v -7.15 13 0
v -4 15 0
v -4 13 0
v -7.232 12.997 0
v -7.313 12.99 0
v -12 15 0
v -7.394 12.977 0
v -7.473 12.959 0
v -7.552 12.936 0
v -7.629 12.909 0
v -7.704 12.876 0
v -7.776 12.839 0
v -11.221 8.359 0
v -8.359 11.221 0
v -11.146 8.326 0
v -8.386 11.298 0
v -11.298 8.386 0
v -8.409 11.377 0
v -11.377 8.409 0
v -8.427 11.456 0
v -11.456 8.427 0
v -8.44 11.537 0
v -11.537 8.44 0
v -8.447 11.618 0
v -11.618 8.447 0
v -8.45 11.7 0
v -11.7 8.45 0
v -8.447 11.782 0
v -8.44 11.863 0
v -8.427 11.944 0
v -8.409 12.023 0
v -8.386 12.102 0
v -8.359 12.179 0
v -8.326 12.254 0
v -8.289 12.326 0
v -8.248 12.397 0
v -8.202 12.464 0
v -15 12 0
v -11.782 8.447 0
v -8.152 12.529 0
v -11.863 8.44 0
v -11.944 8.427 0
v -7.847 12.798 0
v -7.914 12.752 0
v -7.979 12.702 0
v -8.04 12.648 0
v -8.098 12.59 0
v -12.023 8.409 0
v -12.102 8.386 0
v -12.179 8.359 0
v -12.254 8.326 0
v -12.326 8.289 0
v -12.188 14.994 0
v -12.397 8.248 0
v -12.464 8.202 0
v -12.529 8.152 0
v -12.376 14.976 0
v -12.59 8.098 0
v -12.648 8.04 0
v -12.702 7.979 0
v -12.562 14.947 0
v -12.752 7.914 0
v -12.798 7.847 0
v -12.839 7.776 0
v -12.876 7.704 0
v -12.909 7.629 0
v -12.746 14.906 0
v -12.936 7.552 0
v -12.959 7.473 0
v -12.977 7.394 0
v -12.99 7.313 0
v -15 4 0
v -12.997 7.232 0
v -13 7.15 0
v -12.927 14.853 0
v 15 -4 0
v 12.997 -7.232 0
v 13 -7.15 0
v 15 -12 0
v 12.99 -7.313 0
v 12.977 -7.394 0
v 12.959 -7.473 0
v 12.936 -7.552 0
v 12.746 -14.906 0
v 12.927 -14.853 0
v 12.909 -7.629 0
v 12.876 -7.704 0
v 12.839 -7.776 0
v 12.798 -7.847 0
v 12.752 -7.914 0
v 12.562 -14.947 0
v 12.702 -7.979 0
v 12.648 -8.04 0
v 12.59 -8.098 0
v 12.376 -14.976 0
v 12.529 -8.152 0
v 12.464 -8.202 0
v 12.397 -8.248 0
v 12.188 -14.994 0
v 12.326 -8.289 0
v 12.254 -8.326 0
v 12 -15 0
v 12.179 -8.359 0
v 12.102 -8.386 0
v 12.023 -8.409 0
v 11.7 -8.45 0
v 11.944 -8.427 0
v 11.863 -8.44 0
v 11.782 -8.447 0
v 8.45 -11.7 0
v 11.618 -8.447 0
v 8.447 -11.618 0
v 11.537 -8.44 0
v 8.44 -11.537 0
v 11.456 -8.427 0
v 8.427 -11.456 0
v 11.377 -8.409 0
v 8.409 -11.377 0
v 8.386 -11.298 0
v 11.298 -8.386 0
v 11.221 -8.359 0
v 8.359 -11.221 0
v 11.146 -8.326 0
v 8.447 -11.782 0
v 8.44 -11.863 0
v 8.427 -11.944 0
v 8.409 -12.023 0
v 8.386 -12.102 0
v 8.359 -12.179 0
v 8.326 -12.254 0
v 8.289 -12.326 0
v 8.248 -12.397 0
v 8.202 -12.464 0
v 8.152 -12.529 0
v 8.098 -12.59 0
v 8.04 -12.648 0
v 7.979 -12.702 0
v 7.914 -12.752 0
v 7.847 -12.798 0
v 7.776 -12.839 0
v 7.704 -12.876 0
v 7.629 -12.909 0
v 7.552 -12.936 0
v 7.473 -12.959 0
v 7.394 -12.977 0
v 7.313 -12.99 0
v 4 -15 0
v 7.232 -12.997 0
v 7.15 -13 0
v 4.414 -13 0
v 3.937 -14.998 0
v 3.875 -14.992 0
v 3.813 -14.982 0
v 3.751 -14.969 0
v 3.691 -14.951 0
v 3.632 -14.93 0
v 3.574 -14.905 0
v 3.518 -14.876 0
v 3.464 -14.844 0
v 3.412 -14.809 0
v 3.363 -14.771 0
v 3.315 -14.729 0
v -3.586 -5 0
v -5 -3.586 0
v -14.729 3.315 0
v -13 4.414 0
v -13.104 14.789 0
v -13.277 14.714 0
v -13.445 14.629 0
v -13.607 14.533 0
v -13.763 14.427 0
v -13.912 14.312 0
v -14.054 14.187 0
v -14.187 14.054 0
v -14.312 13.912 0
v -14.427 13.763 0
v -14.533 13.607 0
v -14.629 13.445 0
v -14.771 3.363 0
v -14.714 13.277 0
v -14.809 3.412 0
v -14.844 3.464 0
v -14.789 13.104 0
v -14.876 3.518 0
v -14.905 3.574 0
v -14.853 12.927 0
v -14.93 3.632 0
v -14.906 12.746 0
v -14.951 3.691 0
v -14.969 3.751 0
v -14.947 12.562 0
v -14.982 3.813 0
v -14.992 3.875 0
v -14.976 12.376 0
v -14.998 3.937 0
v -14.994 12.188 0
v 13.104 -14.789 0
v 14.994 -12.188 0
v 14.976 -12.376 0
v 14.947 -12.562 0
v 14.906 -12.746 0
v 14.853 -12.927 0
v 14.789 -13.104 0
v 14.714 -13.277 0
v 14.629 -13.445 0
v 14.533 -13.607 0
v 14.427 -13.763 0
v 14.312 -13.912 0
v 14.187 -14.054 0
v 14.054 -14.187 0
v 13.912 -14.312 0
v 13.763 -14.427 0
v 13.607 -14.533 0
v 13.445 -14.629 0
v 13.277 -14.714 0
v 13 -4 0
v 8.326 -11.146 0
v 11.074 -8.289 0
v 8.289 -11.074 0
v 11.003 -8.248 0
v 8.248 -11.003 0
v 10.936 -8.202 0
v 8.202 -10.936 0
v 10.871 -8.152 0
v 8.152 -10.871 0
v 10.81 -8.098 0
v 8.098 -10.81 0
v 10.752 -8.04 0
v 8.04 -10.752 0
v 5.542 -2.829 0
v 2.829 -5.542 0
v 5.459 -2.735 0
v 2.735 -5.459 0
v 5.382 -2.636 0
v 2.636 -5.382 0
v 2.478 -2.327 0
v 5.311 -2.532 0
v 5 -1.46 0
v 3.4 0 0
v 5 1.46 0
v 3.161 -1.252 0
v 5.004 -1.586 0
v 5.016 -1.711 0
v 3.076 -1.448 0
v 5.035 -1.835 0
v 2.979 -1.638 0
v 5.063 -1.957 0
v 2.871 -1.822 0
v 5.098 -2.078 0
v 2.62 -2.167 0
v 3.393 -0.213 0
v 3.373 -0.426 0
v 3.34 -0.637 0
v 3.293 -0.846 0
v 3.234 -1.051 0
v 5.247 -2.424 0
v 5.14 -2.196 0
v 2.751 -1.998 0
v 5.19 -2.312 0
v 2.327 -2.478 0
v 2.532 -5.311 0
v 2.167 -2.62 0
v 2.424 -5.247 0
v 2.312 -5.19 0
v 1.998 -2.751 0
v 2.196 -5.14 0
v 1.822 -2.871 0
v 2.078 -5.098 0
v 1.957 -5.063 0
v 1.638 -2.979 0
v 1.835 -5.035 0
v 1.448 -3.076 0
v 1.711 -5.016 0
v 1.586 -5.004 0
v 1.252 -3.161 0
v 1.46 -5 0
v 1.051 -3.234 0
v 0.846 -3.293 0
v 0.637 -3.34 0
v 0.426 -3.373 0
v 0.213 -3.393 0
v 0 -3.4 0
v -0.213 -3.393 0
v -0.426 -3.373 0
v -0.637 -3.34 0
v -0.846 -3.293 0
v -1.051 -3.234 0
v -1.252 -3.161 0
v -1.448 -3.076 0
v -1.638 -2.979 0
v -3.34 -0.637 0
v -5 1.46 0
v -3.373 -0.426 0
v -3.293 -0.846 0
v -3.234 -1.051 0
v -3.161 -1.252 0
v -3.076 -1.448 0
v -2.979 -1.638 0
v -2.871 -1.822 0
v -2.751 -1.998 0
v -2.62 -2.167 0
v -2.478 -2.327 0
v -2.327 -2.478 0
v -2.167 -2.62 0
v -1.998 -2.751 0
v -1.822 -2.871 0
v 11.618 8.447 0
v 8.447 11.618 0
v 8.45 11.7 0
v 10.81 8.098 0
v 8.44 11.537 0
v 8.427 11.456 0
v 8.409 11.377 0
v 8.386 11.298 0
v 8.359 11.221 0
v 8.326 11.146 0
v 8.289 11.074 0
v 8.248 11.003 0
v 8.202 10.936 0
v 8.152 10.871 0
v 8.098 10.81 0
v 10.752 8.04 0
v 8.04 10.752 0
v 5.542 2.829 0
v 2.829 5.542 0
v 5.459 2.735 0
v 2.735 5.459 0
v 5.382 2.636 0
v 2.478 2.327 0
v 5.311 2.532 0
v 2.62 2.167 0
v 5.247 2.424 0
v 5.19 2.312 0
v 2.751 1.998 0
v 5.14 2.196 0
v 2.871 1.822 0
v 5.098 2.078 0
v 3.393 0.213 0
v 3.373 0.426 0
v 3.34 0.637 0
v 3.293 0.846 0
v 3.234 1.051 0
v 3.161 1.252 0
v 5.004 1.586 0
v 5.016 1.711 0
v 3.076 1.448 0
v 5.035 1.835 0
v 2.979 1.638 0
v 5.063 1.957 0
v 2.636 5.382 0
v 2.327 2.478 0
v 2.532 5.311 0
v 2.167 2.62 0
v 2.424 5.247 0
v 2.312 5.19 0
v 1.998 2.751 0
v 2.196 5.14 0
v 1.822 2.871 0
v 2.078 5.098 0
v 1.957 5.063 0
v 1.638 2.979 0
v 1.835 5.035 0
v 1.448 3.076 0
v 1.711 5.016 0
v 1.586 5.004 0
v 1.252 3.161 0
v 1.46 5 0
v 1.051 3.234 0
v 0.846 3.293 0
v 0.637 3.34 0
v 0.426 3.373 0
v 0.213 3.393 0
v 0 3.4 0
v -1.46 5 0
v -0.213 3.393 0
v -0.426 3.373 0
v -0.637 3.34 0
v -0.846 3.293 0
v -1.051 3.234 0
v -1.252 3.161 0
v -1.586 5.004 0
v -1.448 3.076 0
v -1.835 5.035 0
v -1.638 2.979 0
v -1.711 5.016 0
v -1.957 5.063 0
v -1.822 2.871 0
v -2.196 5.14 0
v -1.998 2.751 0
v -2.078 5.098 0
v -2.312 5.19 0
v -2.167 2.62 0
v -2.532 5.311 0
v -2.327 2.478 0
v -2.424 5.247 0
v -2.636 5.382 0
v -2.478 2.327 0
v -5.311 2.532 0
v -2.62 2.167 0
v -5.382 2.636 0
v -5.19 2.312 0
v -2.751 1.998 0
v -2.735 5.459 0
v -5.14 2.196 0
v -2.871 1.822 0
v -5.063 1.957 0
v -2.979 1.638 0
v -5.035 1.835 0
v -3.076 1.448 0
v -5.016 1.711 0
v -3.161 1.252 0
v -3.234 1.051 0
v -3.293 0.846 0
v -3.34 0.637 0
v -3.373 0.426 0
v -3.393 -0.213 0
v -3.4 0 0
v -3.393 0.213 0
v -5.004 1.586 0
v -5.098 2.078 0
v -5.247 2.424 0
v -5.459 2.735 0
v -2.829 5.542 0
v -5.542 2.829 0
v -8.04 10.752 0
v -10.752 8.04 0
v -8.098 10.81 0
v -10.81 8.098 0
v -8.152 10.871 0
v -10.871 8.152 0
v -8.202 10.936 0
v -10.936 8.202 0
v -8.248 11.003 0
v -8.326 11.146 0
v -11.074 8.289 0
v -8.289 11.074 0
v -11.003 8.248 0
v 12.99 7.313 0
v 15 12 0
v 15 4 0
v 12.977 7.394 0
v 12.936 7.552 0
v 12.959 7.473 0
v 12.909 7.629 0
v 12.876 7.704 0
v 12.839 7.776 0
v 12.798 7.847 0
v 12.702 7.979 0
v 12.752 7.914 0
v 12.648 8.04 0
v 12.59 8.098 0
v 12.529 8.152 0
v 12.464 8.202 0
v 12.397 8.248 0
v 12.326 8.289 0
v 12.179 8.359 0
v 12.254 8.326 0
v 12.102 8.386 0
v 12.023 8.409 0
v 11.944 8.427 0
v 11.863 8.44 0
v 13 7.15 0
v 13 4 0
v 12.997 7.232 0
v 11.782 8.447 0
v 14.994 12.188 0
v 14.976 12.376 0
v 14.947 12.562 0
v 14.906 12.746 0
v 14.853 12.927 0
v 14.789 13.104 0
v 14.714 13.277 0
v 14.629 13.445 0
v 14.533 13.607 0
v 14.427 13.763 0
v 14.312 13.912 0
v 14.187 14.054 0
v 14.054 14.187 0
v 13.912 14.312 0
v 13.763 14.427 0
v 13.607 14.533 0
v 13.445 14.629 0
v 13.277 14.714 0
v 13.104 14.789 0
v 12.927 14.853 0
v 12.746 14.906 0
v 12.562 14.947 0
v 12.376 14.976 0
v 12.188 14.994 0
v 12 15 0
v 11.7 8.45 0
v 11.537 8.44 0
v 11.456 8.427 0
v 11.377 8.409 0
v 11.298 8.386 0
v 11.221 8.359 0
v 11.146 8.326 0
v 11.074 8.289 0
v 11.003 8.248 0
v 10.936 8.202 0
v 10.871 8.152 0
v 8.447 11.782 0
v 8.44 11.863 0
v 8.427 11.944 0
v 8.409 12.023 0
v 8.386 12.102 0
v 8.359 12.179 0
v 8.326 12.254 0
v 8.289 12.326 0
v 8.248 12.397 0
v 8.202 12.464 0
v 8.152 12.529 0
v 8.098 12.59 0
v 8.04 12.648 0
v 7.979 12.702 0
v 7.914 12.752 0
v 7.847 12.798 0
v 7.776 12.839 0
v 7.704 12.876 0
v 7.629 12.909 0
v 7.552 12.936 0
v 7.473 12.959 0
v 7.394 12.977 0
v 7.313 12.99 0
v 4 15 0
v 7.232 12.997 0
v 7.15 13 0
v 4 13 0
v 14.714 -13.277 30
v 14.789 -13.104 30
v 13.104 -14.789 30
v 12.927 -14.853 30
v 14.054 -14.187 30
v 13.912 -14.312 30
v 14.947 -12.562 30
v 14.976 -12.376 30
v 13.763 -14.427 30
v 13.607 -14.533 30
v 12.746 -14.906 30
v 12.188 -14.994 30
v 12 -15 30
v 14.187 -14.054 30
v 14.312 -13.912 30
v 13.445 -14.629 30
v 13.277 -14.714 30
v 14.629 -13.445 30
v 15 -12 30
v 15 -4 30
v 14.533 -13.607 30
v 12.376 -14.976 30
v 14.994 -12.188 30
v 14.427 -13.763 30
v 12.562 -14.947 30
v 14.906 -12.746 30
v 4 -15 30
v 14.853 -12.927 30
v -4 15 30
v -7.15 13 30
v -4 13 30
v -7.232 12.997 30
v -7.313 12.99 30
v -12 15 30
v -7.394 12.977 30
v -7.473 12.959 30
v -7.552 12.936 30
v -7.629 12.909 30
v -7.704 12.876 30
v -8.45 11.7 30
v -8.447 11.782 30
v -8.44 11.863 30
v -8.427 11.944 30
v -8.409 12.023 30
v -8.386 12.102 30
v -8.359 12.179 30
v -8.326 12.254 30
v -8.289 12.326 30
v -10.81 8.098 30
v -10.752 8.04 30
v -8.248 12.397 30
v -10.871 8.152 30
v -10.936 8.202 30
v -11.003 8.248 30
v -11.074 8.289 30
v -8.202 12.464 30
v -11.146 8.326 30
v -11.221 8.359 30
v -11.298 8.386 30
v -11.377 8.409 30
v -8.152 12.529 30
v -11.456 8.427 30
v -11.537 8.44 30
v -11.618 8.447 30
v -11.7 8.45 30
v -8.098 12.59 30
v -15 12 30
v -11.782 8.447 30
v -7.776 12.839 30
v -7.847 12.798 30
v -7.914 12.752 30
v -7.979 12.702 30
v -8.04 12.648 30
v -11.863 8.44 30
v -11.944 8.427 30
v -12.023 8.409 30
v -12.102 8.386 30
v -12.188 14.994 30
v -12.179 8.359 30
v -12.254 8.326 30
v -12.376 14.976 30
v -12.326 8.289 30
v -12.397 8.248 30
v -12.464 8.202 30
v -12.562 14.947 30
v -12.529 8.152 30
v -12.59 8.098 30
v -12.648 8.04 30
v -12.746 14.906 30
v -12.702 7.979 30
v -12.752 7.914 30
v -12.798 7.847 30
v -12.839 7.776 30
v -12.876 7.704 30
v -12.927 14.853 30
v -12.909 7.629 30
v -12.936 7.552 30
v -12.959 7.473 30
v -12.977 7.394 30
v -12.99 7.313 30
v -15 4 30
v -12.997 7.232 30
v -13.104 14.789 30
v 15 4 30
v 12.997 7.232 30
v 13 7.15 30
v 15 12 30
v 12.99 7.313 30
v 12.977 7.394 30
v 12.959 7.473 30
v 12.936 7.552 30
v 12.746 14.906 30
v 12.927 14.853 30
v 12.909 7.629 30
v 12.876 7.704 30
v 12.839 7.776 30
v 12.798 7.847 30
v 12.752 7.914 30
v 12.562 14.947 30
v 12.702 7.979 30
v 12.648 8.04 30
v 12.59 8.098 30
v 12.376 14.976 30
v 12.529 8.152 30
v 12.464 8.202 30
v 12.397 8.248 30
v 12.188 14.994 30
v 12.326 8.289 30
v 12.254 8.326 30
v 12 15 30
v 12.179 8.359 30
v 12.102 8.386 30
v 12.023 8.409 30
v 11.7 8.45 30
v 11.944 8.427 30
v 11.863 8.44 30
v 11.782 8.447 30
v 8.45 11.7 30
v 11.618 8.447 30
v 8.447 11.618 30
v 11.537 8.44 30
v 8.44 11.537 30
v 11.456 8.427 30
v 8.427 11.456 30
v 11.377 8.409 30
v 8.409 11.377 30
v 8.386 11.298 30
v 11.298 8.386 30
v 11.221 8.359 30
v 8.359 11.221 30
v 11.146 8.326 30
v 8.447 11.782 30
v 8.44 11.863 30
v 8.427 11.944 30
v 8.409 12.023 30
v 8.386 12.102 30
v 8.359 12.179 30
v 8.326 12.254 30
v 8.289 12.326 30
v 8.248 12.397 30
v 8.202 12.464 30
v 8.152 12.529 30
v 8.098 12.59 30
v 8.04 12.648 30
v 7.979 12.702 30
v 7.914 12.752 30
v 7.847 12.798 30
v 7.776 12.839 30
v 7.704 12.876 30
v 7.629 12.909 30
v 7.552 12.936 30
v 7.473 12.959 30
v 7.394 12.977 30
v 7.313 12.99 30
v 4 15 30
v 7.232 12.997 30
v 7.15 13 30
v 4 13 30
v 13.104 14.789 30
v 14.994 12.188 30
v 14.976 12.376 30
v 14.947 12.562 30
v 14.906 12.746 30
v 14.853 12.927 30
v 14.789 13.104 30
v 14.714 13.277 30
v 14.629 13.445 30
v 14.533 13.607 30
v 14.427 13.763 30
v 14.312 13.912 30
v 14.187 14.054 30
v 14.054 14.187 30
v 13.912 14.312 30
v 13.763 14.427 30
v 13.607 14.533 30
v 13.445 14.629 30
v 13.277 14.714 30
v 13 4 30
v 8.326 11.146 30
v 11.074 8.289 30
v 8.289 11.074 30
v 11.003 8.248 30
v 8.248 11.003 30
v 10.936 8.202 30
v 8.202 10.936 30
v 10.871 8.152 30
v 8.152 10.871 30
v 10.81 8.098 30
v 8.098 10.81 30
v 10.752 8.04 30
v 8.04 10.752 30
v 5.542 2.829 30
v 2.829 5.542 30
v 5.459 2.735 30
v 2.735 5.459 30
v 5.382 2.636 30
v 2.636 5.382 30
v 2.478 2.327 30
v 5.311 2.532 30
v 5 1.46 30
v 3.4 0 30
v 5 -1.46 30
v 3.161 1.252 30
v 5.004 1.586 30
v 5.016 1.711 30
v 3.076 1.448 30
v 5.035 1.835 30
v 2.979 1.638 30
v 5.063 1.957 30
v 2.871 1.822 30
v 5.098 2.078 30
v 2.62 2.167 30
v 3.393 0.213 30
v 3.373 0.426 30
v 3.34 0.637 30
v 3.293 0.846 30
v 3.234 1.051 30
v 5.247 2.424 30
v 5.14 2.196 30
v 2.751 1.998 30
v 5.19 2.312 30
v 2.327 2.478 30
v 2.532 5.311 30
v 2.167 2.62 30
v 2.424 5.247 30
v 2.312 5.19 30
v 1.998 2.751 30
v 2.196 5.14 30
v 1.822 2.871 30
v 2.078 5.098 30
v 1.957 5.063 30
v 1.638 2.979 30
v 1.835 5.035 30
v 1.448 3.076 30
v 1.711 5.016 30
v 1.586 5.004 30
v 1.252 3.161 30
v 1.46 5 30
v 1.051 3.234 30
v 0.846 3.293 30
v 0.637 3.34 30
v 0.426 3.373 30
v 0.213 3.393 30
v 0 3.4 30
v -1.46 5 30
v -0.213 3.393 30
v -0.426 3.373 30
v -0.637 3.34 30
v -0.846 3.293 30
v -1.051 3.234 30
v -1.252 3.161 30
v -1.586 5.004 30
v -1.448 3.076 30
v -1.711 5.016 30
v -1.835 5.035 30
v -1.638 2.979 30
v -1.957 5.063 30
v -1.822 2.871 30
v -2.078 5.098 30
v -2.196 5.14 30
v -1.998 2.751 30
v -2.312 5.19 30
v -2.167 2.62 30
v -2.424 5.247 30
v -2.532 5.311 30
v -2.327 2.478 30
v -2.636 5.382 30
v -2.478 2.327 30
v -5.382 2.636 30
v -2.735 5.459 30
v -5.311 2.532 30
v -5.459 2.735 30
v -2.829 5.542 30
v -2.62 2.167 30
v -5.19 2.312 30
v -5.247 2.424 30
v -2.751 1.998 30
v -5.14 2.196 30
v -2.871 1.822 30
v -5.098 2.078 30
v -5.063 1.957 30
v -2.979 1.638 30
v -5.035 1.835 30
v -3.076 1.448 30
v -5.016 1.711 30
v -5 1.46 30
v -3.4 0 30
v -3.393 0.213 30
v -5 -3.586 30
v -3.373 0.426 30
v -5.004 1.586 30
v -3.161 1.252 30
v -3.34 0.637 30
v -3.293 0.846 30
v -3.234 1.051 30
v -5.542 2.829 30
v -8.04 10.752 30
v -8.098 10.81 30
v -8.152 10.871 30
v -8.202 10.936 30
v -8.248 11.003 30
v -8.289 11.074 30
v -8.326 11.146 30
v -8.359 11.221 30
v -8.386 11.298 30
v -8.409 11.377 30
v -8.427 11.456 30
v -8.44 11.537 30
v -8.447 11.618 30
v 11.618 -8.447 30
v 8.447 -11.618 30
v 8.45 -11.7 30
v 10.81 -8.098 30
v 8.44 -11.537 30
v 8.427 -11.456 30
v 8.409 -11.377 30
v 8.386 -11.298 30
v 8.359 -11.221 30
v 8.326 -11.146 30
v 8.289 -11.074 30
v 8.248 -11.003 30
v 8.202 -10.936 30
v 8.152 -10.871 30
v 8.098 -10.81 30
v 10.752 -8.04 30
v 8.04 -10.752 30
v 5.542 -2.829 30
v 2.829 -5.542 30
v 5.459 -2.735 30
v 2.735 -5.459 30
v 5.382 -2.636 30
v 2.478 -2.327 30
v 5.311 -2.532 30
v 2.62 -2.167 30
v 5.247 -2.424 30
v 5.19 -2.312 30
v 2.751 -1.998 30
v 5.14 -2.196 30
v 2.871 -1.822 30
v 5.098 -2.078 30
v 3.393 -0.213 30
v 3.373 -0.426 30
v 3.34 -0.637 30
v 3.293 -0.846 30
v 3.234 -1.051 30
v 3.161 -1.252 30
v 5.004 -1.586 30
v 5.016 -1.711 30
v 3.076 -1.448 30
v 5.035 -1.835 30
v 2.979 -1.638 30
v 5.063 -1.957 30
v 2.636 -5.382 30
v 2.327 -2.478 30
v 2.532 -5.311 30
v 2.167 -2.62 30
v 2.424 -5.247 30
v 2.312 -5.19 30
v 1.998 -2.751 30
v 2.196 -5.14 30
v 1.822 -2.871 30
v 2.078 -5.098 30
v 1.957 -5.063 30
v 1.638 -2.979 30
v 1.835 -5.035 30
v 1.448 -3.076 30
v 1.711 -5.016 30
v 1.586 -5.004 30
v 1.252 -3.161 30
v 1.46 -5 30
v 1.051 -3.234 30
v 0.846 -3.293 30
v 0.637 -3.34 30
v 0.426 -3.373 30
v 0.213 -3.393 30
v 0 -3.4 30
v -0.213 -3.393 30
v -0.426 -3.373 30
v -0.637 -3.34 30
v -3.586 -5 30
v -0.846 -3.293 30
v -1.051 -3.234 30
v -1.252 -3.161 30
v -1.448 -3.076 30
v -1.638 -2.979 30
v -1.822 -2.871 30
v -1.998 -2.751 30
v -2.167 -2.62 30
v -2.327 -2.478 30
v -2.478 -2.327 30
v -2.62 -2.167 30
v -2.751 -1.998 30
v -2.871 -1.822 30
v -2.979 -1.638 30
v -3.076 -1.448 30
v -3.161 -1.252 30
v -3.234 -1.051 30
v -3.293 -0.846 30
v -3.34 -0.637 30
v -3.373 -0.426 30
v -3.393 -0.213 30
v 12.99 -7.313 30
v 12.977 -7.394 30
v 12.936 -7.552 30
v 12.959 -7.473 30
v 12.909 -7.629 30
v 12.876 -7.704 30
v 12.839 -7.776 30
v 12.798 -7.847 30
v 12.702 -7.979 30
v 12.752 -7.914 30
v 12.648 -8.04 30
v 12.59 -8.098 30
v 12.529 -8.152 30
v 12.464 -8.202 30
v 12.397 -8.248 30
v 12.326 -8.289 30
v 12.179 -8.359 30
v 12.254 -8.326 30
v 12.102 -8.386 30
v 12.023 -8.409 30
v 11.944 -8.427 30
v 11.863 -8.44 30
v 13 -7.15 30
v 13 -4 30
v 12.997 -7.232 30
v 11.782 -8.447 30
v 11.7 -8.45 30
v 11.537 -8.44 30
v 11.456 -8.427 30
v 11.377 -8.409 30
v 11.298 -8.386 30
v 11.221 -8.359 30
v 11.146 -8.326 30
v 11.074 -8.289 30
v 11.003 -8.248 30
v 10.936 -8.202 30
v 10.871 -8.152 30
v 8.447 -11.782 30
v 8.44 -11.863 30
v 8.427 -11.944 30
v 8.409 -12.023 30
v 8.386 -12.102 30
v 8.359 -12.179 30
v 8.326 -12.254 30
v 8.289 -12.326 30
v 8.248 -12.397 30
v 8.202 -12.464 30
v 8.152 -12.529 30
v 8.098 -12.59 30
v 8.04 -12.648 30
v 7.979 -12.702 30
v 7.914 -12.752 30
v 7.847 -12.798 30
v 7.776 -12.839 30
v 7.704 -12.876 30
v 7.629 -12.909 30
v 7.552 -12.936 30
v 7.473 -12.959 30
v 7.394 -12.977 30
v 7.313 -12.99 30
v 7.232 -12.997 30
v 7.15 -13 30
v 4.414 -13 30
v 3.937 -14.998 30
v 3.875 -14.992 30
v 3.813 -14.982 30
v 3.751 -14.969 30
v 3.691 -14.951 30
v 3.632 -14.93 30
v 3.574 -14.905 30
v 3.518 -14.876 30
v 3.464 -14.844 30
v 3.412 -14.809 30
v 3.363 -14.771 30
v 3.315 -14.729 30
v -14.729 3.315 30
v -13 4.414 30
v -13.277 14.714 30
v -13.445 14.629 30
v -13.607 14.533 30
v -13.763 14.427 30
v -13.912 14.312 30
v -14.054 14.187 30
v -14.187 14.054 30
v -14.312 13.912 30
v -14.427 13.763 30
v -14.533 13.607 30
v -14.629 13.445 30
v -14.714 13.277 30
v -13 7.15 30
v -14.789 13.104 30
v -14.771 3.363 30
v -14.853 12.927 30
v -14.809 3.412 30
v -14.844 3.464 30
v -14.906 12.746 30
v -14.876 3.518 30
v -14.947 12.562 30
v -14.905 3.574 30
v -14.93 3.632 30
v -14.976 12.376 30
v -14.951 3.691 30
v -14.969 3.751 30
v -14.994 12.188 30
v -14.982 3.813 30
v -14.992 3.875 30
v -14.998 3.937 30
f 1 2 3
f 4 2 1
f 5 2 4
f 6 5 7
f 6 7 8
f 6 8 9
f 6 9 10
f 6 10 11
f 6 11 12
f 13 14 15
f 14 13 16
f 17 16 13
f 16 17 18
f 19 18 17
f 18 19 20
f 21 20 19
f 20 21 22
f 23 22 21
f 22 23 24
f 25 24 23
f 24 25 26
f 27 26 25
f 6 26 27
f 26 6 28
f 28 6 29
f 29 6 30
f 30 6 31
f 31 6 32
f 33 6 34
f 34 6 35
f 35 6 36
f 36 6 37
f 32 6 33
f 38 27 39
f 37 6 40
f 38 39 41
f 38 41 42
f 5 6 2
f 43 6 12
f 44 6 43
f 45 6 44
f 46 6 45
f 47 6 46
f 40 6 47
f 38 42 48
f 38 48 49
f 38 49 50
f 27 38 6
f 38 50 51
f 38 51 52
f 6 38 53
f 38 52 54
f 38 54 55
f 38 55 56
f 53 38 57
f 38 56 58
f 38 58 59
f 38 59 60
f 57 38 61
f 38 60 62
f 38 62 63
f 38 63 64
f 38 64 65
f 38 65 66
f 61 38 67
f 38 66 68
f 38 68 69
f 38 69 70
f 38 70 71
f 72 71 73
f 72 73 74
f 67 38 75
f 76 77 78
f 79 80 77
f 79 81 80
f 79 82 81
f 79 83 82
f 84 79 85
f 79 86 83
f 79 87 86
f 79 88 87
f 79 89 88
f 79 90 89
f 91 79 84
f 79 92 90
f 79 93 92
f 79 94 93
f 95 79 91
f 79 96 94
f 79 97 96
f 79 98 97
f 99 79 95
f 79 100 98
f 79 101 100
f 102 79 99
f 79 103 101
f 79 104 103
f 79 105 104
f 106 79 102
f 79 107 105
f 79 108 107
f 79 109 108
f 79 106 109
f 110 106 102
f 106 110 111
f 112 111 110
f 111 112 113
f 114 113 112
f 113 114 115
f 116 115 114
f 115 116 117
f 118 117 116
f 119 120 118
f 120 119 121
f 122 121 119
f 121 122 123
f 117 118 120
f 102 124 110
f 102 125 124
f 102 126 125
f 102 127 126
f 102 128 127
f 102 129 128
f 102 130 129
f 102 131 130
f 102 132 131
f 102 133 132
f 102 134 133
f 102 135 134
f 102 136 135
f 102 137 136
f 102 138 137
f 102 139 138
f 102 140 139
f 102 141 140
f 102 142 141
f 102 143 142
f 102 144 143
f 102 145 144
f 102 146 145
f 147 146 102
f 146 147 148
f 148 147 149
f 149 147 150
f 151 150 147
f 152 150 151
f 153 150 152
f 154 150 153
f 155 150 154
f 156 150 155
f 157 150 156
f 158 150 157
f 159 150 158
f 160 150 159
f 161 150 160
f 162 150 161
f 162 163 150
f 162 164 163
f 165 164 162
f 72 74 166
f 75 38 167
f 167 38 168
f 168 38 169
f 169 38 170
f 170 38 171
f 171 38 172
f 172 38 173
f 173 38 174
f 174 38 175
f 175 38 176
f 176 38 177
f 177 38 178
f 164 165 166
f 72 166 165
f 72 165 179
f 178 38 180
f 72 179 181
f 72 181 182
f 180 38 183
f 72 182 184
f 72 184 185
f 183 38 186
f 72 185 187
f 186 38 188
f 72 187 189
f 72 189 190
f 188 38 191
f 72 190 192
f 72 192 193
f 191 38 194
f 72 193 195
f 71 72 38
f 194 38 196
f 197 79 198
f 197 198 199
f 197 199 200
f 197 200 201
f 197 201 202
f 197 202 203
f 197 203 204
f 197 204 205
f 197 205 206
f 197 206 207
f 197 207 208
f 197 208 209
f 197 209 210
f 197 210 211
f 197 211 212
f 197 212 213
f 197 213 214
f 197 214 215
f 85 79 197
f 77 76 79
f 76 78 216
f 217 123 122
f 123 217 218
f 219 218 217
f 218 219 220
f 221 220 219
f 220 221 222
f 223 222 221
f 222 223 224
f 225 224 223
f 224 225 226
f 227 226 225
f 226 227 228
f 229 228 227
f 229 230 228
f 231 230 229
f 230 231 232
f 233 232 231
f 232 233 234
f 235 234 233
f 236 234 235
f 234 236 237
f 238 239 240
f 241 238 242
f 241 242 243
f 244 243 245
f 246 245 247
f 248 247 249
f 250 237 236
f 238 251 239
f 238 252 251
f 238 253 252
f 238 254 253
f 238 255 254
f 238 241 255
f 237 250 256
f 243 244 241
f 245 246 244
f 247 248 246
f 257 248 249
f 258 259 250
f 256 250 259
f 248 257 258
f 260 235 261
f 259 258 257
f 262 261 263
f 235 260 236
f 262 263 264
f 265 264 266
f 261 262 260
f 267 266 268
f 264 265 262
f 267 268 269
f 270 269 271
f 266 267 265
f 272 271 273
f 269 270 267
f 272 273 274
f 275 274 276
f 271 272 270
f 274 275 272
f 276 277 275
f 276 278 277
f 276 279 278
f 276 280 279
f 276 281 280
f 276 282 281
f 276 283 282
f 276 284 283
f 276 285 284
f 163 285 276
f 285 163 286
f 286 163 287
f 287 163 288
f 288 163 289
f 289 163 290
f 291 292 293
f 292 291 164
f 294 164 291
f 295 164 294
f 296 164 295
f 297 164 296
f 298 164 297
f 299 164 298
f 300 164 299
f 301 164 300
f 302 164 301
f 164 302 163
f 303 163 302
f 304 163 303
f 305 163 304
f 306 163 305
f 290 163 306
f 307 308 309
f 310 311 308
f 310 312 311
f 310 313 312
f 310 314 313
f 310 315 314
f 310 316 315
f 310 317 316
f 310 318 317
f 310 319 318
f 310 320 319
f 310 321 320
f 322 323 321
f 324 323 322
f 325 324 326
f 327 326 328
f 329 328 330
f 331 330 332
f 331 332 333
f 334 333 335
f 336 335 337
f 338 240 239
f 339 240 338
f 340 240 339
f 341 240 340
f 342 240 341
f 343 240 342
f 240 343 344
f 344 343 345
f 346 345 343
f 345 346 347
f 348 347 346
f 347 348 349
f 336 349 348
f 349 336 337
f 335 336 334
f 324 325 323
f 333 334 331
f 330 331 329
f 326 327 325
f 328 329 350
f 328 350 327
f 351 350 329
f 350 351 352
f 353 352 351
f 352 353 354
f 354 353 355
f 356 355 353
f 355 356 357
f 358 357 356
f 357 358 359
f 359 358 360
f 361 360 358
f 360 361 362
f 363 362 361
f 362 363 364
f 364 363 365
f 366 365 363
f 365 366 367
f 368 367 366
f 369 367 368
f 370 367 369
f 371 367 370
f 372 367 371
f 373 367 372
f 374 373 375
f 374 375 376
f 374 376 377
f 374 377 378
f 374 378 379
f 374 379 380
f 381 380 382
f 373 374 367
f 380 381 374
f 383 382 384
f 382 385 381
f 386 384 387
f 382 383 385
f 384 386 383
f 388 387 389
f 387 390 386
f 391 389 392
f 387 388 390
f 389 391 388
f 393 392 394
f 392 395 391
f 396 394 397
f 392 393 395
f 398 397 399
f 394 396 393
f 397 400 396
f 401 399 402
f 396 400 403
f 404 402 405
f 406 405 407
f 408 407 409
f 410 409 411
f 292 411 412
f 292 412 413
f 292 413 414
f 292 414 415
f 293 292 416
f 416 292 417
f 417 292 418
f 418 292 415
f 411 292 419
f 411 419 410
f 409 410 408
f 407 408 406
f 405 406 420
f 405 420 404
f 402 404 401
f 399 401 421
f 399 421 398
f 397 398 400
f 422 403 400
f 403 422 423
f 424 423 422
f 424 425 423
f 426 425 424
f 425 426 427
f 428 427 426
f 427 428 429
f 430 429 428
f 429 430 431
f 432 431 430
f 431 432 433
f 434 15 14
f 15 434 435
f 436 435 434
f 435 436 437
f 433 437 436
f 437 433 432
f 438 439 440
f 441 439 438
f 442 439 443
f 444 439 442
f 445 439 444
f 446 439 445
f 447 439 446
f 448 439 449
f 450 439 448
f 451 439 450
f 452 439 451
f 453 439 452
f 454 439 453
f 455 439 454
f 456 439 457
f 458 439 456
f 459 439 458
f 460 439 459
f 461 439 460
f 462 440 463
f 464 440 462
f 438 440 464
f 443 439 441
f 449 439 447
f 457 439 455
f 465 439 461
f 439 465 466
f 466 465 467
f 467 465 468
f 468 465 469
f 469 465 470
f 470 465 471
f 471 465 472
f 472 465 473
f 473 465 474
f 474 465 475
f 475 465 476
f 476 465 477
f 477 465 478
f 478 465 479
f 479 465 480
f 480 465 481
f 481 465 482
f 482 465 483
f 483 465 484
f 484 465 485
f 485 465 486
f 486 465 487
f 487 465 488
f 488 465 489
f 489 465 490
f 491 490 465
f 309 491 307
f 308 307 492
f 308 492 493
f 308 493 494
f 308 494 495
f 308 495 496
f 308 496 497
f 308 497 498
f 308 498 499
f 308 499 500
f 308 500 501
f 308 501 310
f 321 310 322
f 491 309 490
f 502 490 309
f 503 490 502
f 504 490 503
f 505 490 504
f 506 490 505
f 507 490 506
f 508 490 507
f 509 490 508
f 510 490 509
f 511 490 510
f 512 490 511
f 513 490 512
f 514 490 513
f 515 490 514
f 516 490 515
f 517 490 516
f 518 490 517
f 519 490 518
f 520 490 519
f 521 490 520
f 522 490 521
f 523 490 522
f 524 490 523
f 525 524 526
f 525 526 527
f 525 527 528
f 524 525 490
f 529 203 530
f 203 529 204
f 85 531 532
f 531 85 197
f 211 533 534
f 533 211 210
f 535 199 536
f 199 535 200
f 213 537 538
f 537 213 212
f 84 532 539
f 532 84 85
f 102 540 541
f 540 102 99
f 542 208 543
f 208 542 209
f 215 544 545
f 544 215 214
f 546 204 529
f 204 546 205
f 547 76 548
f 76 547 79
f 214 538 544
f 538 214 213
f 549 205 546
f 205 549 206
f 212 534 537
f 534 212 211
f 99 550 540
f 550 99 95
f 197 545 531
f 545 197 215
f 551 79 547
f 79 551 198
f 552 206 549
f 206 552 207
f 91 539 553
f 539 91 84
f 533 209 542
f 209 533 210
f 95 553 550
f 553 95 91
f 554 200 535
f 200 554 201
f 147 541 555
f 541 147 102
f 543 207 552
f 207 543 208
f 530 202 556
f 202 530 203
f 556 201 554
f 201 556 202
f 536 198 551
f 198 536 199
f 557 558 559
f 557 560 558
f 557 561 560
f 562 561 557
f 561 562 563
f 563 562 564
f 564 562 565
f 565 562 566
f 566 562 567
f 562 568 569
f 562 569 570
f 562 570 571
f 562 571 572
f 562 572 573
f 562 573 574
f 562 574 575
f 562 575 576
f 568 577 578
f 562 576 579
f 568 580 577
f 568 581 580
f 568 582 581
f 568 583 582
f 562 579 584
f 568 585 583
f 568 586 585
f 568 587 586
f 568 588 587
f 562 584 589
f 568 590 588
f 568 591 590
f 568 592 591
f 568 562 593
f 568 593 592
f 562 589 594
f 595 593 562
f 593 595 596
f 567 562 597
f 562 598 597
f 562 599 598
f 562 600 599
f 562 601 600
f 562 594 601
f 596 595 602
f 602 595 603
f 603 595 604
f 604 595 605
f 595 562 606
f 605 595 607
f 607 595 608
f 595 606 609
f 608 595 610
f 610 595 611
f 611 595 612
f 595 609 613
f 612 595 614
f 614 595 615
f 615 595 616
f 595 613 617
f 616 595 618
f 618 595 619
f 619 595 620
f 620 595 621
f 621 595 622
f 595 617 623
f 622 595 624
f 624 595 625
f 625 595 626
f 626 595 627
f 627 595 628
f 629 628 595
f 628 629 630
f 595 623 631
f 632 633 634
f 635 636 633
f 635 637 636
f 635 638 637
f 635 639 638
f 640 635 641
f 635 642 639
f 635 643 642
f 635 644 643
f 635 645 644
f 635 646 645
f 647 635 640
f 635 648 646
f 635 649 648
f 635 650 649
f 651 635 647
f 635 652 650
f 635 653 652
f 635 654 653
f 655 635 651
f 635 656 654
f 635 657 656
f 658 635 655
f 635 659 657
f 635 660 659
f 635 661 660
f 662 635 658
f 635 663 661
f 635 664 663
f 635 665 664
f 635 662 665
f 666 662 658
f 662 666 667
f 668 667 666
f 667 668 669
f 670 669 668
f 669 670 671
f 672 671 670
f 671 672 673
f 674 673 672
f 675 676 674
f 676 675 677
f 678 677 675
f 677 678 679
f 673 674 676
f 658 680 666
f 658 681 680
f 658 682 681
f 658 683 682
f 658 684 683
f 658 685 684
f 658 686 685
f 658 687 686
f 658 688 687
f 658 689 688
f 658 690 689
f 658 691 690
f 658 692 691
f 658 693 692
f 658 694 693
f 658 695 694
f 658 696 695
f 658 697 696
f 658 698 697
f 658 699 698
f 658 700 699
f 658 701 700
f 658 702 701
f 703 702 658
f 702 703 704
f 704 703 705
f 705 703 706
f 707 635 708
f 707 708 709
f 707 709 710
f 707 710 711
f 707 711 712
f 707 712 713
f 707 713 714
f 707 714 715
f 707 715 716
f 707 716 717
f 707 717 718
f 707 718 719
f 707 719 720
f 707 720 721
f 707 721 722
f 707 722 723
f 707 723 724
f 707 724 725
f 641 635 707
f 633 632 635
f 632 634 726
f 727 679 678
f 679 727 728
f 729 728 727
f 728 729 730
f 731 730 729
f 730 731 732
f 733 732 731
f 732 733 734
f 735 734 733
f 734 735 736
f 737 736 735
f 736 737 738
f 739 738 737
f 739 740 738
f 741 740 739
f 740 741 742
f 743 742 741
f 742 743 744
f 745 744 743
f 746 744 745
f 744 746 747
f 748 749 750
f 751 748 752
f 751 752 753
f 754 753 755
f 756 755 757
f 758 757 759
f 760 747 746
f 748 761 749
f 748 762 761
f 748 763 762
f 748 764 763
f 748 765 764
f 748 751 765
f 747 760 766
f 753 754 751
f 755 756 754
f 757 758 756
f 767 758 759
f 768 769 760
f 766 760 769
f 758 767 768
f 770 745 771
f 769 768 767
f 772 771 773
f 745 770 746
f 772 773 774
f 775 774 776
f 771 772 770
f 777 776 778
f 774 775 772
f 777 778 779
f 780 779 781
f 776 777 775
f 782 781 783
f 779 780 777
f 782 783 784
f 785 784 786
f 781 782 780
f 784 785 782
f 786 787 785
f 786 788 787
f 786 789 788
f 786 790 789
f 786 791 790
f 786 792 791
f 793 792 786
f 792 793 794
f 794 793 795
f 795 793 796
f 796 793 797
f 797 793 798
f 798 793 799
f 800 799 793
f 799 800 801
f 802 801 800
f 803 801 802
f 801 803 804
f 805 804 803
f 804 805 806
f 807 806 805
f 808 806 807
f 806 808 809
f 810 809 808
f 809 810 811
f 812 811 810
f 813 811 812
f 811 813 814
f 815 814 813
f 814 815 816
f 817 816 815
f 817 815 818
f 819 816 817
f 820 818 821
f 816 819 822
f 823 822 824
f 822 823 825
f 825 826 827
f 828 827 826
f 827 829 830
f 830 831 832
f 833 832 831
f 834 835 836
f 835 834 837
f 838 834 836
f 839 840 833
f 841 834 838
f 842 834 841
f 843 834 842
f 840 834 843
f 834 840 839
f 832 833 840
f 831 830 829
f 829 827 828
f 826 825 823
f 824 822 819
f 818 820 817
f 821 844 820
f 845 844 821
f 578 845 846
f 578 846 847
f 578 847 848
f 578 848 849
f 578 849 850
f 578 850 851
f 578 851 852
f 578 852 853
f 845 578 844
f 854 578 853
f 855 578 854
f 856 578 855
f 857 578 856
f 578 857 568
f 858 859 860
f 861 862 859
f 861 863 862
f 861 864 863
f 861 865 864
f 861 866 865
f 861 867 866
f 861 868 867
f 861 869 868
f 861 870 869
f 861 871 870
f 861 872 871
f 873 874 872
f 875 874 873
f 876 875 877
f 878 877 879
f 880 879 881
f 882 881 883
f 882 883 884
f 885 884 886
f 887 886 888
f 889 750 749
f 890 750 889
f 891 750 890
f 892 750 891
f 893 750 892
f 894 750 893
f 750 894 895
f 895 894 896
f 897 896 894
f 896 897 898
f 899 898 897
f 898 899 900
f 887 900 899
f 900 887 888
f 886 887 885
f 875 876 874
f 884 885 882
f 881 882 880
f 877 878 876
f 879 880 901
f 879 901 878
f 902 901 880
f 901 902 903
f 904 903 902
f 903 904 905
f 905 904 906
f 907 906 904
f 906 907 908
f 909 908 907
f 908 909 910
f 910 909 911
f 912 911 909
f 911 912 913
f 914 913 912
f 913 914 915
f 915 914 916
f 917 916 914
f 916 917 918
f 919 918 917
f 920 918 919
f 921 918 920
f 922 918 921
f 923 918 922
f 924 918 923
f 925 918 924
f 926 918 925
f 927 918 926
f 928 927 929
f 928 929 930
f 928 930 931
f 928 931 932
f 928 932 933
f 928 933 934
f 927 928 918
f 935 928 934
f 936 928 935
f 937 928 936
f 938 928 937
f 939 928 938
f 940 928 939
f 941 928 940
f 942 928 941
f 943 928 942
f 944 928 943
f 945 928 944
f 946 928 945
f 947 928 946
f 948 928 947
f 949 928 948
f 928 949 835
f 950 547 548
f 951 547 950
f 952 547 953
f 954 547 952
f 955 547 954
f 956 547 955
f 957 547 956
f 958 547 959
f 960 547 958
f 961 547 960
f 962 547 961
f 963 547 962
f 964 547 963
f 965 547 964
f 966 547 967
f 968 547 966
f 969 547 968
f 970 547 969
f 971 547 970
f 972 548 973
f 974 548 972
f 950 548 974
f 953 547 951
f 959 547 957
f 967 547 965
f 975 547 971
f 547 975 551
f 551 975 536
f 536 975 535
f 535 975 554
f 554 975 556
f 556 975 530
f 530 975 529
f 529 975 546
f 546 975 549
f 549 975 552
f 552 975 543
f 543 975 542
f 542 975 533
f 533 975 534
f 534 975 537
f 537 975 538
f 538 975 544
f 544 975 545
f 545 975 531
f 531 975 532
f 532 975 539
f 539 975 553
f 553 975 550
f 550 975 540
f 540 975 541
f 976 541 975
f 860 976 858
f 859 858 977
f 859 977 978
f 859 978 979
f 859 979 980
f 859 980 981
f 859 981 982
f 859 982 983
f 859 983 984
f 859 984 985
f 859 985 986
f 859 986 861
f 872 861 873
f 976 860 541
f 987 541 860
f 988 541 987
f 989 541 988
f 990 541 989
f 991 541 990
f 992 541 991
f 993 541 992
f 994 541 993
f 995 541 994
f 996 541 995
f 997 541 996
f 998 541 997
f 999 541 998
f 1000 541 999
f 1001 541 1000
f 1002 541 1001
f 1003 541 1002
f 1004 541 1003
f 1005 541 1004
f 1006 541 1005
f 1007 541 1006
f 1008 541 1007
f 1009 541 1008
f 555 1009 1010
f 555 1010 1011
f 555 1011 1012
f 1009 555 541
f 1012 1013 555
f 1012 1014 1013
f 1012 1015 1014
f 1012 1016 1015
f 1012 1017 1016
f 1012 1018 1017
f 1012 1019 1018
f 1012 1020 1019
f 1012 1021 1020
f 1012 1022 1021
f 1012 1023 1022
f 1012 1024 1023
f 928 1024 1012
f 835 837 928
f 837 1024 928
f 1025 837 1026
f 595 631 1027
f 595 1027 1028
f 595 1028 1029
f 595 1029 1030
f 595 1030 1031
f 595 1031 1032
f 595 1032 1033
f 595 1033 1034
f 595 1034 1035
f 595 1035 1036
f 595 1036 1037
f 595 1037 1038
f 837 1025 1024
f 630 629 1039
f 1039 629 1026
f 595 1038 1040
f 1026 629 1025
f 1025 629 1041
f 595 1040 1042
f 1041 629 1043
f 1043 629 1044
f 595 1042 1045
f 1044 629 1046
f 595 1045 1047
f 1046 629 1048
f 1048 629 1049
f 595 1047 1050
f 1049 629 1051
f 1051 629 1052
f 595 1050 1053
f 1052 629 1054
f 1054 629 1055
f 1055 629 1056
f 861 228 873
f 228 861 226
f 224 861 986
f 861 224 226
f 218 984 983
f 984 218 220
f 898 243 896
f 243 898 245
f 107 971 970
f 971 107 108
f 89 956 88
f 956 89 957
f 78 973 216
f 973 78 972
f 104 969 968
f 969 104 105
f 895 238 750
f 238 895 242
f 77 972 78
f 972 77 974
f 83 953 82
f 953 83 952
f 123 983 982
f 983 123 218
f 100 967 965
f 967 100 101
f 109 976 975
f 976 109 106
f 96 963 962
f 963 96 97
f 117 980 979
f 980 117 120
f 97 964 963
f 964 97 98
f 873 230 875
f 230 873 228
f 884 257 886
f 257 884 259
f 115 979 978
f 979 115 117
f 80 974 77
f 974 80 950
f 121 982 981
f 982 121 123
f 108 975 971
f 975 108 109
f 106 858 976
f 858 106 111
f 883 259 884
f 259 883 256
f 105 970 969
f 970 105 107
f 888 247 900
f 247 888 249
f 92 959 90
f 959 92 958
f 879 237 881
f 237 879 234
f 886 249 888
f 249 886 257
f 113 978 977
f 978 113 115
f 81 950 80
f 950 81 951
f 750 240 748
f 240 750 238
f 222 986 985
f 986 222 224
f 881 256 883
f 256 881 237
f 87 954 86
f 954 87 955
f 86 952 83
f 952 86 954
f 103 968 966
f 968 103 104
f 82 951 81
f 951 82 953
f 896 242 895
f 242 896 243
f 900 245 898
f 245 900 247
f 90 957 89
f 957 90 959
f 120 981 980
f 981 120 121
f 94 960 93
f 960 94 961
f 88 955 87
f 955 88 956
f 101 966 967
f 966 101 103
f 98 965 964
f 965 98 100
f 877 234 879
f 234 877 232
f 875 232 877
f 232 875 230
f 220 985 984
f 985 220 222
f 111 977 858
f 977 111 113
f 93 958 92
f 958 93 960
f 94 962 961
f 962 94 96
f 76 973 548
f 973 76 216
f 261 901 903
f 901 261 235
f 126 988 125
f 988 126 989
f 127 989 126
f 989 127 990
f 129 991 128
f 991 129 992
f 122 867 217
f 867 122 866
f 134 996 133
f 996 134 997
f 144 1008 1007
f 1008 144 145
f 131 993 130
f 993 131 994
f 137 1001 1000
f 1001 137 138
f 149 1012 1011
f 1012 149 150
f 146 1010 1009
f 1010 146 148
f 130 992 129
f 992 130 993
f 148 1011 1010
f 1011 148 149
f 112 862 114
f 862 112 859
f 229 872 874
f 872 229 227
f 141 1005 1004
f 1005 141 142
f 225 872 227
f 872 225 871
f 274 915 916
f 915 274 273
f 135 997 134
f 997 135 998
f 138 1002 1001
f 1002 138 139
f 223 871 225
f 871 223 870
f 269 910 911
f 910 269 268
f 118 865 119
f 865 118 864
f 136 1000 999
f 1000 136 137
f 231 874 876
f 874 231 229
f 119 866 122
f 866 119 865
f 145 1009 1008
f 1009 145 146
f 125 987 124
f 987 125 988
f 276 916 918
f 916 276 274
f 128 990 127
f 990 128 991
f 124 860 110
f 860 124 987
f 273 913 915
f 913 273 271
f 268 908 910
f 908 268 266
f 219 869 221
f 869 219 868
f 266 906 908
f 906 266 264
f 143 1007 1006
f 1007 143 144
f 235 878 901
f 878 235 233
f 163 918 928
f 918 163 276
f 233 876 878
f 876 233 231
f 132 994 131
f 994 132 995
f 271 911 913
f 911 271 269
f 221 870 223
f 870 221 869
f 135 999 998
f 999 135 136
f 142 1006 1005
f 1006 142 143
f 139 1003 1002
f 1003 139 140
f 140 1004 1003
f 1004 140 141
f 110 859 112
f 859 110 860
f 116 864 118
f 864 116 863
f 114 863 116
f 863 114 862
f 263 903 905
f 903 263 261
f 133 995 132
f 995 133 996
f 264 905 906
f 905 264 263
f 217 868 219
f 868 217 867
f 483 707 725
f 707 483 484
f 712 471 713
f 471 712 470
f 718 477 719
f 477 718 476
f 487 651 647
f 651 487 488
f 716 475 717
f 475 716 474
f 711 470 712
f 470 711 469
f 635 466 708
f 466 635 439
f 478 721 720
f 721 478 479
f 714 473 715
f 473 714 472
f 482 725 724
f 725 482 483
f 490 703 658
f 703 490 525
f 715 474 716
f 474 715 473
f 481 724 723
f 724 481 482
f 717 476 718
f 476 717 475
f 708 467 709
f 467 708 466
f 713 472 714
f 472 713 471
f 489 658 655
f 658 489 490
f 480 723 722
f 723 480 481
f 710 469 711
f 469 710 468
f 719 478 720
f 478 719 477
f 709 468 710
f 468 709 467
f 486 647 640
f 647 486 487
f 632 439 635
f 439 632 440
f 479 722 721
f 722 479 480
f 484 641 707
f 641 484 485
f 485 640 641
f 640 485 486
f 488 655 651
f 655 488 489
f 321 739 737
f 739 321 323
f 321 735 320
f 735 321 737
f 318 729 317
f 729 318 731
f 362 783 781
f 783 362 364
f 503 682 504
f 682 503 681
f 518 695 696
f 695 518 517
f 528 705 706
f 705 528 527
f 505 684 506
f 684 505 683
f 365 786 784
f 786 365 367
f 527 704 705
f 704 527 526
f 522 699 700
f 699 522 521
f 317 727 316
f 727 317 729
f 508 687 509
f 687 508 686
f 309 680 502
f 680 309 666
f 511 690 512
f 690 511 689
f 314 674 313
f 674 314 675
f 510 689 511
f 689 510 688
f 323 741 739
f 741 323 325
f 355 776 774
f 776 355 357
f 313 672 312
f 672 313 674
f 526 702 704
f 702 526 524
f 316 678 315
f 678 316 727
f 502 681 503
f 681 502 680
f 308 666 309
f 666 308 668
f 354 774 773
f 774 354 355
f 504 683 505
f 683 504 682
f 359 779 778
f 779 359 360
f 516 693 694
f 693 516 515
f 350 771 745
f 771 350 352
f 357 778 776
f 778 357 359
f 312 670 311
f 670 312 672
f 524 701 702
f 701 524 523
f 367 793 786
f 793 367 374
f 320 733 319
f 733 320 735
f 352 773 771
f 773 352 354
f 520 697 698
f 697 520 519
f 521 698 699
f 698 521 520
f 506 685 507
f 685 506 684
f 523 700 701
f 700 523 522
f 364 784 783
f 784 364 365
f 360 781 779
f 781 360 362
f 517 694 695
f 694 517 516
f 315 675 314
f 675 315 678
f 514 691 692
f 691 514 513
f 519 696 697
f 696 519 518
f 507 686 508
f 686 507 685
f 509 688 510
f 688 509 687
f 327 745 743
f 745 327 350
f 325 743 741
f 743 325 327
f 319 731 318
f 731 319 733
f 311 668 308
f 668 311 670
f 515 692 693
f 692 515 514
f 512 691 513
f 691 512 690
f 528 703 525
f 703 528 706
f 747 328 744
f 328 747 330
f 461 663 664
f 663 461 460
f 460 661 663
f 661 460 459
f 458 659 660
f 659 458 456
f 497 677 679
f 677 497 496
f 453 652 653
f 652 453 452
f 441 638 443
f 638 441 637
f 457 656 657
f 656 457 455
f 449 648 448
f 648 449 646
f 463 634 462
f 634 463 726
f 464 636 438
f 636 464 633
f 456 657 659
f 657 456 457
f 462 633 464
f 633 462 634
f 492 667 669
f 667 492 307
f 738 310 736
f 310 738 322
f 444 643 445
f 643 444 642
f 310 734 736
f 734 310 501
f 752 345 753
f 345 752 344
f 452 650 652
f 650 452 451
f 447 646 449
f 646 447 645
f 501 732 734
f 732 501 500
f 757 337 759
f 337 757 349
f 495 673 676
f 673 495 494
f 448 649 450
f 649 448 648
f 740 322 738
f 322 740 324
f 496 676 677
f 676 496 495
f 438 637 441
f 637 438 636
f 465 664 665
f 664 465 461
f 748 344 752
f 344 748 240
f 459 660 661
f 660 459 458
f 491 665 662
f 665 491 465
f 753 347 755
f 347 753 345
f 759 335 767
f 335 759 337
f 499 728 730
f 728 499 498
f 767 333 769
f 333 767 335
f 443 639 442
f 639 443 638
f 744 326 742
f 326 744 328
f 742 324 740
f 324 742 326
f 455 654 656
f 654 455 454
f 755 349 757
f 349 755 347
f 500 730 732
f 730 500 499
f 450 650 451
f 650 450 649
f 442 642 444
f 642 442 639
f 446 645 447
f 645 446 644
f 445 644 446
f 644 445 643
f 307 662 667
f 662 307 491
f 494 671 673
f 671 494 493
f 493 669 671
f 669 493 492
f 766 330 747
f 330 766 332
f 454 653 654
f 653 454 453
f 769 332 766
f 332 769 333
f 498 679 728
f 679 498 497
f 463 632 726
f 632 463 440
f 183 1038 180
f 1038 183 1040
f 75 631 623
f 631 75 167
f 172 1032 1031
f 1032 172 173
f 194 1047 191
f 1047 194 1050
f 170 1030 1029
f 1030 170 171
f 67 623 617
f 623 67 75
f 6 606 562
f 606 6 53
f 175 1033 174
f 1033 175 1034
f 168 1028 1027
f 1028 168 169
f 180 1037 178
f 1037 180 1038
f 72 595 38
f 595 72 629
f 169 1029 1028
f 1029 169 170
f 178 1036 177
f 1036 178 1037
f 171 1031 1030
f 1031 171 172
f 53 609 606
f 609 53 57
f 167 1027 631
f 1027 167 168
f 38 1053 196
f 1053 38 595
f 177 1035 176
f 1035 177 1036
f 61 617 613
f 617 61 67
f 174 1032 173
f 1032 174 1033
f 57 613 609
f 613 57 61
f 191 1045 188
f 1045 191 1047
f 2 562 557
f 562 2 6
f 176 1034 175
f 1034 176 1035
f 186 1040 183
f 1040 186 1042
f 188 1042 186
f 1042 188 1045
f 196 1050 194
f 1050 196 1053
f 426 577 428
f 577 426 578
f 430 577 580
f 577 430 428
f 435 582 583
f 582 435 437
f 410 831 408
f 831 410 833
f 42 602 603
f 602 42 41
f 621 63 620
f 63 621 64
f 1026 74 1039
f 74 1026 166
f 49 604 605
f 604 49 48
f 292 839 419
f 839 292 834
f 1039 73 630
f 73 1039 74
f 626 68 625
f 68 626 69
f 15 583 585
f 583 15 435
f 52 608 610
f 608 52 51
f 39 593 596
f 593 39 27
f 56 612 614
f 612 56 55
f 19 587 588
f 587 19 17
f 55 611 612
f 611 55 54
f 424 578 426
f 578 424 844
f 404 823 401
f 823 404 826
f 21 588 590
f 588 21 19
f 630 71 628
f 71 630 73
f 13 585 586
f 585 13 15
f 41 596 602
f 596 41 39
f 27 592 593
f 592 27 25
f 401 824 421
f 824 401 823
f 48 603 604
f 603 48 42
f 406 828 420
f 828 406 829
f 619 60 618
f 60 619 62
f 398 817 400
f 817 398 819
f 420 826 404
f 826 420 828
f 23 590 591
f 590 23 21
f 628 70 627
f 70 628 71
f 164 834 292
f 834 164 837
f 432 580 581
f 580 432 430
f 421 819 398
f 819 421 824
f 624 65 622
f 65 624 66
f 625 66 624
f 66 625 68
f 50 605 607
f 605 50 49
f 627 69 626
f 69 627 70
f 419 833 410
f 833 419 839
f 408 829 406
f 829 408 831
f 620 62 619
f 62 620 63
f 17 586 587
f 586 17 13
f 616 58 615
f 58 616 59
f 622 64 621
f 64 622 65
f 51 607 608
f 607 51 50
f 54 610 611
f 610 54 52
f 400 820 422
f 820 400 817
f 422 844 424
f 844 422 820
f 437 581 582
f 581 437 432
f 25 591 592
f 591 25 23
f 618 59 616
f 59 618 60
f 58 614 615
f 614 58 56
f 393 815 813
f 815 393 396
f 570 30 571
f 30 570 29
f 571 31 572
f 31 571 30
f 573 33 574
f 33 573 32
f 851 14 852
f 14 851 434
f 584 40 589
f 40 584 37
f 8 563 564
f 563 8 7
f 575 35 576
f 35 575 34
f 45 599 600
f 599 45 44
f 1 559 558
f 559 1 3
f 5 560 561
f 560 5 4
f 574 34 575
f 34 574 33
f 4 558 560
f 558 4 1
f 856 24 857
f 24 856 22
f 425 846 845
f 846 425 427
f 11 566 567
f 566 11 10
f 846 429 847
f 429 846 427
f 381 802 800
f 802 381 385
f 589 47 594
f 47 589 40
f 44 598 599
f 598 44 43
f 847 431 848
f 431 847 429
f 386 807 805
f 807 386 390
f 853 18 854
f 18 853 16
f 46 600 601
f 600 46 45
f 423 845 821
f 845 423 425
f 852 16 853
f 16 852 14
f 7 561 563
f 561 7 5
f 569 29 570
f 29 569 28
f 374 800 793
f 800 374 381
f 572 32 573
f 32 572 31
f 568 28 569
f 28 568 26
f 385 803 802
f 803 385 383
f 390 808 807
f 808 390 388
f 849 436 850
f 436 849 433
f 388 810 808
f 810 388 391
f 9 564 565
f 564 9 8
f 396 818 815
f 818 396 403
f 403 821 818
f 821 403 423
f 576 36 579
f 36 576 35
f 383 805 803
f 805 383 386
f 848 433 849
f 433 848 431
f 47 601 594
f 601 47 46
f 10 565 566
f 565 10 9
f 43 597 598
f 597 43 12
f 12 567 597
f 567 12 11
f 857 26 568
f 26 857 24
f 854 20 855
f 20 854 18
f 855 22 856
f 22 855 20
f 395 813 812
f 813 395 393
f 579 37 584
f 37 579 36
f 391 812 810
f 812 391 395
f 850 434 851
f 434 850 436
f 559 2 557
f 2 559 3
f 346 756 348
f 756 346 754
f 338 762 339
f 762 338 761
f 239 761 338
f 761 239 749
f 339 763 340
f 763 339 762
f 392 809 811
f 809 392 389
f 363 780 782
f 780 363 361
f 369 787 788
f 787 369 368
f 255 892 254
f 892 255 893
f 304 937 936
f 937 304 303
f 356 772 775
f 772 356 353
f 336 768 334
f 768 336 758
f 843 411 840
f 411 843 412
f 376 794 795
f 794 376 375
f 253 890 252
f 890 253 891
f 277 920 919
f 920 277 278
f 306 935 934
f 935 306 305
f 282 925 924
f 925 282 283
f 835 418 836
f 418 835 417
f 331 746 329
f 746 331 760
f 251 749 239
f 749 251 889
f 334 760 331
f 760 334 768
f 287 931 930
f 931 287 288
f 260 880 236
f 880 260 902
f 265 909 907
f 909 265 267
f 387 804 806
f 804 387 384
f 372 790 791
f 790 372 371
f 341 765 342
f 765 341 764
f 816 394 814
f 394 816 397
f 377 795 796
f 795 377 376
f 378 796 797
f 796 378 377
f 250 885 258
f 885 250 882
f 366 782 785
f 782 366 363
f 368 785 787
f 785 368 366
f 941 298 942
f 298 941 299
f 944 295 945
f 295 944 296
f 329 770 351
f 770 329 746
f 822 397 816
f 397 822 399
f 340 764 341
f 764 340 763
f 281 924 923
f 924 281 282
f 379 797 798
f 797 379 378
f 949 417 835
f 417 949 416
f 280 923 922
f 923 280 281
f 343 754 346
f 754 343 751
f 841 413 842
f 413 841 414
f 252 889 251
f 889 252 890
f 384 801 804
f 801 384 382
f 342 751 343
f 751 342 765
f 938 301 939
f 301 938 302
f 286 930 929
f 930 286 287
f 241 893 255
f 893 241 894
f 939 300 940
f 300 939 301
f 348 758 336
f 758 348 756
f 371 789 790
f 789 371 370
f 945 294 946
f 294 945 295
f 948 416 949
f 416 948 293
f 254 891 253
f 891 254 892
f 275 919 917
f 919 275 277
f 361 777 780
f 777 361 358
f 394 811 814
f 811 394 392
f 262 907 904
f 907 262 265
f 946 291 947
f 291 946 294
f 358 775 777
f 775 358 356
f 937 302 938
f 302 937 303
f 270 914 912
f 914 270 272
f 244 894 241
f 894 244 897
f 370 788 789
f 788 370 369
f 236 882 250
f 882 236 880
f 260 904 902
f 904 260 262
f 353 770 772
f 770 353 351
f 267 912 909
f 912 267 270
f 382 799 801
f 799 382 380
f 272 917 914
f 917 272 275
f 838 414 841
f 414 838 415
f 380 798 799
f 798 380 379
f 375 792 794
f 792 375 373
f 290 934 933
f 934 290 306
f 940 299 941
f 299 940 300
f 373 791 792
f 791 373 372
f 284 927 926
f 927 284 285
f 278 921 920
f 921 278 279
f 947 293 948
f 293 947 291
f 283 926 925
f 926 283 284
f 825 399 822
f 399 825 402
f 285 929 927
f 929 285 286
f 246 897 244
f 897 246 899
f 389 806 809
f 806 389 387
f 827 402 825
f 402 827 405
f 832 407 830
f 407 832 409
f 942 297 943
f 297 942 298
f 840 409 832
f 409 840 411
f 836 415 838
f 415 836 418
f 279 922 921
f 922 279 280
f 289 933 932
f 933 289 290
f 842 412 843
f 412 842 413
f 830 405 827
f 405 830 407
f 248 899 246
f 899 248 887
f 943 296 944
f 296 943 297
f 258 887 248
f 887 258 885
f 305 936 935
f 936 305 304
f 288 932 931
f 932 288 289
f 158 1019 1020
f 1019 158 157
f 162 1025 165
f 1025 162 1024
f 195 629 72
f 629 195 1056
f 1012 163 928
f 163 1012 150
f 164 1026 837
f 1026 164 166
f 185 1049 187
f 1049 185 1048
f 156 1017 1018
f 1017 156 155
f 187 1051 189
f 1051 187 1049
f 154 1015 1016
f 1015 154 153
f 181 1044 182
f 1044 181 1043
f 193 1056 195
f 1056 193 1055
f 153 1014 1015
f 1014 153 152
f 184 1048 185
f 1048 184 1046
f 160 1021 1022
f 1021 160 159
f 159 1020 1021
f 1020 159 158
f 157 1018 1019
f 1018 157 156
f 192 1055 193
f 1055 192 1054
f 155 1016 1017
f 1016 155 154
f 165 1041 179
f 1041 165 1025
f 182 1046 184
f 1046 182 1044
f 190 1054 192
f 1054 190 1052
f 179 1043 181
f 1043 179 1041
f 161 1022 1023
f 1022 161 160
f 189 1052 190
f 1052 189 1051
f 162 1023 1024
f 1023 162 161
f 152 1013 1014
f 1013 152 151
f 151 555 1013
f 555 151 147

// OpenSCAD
// variables
height = 30; // [1:400]
size = 8; // [4,6,8]
// calculations
s = size/8;
// model
scale([s,s,1]) union(){
for (z = [1, 2, 3]) 
{
	rotate([0,0,90*z]) translate([-15,-15,0]) difference(){
		hull(){
			translate([3,3,0]) cylinder(h=height,r=3,$fn=100);
			translate([9,0,0]) cube([6,6,height]);
			translate([9,9,0]) cube([6,6,height]);
			translate([0,9,0]) cube([6,6,height]);
		}
		hull(){
			translate([7.85,3.3,0]) cylinder(h=height,r=1.3,$fn=100);
			translate([14,2,0]) cube([1,1,height]);
			translate([13.54,8,0]) cylinder(h=height,r=2,$fn=100);
			translate([14,9,0]) cube([1,1,height]);
		}
		hull(){
			translate([11,0,0]) cube([2,2,height]);
			translate([13,0,0]) cube([2,2,height]);
		}
		mirror([5,-5,0]) hull(){
			translate([7.85,3.3,0]) cylinder(h=height,r=1.3,$fn=100);
			translate([14,2,0]) cube([1,1,height]);
			translate([13.54,8,0]) cylinder(h=height,r=2,$fn=100);
			translate([14,9,0]) cube([1,1,height]);
		}
		mirror([5,-5,0]) hull(){
			translate([11,-0.5,0]) cube([3,3,height]);
			translate([13,-0.5,0]) cube([3,3,height]);
		}
		translate([15,15,0]) cylinder(h=height,r=3.4,$fn=100);
	}
}
	difference(){
		translate([-5,-5,0]) cube([10,10,height]);
		translate([0,0,0]) cylinder(h=height,r=3.4,$fn=100);
	}
	hull(){
		translate([-14,4,0]) cylinder(h=height,r=1,$fn=100);
		translate([4,-14,0]) cylinder(h=height,r=1,$fn=100);
	}
}
